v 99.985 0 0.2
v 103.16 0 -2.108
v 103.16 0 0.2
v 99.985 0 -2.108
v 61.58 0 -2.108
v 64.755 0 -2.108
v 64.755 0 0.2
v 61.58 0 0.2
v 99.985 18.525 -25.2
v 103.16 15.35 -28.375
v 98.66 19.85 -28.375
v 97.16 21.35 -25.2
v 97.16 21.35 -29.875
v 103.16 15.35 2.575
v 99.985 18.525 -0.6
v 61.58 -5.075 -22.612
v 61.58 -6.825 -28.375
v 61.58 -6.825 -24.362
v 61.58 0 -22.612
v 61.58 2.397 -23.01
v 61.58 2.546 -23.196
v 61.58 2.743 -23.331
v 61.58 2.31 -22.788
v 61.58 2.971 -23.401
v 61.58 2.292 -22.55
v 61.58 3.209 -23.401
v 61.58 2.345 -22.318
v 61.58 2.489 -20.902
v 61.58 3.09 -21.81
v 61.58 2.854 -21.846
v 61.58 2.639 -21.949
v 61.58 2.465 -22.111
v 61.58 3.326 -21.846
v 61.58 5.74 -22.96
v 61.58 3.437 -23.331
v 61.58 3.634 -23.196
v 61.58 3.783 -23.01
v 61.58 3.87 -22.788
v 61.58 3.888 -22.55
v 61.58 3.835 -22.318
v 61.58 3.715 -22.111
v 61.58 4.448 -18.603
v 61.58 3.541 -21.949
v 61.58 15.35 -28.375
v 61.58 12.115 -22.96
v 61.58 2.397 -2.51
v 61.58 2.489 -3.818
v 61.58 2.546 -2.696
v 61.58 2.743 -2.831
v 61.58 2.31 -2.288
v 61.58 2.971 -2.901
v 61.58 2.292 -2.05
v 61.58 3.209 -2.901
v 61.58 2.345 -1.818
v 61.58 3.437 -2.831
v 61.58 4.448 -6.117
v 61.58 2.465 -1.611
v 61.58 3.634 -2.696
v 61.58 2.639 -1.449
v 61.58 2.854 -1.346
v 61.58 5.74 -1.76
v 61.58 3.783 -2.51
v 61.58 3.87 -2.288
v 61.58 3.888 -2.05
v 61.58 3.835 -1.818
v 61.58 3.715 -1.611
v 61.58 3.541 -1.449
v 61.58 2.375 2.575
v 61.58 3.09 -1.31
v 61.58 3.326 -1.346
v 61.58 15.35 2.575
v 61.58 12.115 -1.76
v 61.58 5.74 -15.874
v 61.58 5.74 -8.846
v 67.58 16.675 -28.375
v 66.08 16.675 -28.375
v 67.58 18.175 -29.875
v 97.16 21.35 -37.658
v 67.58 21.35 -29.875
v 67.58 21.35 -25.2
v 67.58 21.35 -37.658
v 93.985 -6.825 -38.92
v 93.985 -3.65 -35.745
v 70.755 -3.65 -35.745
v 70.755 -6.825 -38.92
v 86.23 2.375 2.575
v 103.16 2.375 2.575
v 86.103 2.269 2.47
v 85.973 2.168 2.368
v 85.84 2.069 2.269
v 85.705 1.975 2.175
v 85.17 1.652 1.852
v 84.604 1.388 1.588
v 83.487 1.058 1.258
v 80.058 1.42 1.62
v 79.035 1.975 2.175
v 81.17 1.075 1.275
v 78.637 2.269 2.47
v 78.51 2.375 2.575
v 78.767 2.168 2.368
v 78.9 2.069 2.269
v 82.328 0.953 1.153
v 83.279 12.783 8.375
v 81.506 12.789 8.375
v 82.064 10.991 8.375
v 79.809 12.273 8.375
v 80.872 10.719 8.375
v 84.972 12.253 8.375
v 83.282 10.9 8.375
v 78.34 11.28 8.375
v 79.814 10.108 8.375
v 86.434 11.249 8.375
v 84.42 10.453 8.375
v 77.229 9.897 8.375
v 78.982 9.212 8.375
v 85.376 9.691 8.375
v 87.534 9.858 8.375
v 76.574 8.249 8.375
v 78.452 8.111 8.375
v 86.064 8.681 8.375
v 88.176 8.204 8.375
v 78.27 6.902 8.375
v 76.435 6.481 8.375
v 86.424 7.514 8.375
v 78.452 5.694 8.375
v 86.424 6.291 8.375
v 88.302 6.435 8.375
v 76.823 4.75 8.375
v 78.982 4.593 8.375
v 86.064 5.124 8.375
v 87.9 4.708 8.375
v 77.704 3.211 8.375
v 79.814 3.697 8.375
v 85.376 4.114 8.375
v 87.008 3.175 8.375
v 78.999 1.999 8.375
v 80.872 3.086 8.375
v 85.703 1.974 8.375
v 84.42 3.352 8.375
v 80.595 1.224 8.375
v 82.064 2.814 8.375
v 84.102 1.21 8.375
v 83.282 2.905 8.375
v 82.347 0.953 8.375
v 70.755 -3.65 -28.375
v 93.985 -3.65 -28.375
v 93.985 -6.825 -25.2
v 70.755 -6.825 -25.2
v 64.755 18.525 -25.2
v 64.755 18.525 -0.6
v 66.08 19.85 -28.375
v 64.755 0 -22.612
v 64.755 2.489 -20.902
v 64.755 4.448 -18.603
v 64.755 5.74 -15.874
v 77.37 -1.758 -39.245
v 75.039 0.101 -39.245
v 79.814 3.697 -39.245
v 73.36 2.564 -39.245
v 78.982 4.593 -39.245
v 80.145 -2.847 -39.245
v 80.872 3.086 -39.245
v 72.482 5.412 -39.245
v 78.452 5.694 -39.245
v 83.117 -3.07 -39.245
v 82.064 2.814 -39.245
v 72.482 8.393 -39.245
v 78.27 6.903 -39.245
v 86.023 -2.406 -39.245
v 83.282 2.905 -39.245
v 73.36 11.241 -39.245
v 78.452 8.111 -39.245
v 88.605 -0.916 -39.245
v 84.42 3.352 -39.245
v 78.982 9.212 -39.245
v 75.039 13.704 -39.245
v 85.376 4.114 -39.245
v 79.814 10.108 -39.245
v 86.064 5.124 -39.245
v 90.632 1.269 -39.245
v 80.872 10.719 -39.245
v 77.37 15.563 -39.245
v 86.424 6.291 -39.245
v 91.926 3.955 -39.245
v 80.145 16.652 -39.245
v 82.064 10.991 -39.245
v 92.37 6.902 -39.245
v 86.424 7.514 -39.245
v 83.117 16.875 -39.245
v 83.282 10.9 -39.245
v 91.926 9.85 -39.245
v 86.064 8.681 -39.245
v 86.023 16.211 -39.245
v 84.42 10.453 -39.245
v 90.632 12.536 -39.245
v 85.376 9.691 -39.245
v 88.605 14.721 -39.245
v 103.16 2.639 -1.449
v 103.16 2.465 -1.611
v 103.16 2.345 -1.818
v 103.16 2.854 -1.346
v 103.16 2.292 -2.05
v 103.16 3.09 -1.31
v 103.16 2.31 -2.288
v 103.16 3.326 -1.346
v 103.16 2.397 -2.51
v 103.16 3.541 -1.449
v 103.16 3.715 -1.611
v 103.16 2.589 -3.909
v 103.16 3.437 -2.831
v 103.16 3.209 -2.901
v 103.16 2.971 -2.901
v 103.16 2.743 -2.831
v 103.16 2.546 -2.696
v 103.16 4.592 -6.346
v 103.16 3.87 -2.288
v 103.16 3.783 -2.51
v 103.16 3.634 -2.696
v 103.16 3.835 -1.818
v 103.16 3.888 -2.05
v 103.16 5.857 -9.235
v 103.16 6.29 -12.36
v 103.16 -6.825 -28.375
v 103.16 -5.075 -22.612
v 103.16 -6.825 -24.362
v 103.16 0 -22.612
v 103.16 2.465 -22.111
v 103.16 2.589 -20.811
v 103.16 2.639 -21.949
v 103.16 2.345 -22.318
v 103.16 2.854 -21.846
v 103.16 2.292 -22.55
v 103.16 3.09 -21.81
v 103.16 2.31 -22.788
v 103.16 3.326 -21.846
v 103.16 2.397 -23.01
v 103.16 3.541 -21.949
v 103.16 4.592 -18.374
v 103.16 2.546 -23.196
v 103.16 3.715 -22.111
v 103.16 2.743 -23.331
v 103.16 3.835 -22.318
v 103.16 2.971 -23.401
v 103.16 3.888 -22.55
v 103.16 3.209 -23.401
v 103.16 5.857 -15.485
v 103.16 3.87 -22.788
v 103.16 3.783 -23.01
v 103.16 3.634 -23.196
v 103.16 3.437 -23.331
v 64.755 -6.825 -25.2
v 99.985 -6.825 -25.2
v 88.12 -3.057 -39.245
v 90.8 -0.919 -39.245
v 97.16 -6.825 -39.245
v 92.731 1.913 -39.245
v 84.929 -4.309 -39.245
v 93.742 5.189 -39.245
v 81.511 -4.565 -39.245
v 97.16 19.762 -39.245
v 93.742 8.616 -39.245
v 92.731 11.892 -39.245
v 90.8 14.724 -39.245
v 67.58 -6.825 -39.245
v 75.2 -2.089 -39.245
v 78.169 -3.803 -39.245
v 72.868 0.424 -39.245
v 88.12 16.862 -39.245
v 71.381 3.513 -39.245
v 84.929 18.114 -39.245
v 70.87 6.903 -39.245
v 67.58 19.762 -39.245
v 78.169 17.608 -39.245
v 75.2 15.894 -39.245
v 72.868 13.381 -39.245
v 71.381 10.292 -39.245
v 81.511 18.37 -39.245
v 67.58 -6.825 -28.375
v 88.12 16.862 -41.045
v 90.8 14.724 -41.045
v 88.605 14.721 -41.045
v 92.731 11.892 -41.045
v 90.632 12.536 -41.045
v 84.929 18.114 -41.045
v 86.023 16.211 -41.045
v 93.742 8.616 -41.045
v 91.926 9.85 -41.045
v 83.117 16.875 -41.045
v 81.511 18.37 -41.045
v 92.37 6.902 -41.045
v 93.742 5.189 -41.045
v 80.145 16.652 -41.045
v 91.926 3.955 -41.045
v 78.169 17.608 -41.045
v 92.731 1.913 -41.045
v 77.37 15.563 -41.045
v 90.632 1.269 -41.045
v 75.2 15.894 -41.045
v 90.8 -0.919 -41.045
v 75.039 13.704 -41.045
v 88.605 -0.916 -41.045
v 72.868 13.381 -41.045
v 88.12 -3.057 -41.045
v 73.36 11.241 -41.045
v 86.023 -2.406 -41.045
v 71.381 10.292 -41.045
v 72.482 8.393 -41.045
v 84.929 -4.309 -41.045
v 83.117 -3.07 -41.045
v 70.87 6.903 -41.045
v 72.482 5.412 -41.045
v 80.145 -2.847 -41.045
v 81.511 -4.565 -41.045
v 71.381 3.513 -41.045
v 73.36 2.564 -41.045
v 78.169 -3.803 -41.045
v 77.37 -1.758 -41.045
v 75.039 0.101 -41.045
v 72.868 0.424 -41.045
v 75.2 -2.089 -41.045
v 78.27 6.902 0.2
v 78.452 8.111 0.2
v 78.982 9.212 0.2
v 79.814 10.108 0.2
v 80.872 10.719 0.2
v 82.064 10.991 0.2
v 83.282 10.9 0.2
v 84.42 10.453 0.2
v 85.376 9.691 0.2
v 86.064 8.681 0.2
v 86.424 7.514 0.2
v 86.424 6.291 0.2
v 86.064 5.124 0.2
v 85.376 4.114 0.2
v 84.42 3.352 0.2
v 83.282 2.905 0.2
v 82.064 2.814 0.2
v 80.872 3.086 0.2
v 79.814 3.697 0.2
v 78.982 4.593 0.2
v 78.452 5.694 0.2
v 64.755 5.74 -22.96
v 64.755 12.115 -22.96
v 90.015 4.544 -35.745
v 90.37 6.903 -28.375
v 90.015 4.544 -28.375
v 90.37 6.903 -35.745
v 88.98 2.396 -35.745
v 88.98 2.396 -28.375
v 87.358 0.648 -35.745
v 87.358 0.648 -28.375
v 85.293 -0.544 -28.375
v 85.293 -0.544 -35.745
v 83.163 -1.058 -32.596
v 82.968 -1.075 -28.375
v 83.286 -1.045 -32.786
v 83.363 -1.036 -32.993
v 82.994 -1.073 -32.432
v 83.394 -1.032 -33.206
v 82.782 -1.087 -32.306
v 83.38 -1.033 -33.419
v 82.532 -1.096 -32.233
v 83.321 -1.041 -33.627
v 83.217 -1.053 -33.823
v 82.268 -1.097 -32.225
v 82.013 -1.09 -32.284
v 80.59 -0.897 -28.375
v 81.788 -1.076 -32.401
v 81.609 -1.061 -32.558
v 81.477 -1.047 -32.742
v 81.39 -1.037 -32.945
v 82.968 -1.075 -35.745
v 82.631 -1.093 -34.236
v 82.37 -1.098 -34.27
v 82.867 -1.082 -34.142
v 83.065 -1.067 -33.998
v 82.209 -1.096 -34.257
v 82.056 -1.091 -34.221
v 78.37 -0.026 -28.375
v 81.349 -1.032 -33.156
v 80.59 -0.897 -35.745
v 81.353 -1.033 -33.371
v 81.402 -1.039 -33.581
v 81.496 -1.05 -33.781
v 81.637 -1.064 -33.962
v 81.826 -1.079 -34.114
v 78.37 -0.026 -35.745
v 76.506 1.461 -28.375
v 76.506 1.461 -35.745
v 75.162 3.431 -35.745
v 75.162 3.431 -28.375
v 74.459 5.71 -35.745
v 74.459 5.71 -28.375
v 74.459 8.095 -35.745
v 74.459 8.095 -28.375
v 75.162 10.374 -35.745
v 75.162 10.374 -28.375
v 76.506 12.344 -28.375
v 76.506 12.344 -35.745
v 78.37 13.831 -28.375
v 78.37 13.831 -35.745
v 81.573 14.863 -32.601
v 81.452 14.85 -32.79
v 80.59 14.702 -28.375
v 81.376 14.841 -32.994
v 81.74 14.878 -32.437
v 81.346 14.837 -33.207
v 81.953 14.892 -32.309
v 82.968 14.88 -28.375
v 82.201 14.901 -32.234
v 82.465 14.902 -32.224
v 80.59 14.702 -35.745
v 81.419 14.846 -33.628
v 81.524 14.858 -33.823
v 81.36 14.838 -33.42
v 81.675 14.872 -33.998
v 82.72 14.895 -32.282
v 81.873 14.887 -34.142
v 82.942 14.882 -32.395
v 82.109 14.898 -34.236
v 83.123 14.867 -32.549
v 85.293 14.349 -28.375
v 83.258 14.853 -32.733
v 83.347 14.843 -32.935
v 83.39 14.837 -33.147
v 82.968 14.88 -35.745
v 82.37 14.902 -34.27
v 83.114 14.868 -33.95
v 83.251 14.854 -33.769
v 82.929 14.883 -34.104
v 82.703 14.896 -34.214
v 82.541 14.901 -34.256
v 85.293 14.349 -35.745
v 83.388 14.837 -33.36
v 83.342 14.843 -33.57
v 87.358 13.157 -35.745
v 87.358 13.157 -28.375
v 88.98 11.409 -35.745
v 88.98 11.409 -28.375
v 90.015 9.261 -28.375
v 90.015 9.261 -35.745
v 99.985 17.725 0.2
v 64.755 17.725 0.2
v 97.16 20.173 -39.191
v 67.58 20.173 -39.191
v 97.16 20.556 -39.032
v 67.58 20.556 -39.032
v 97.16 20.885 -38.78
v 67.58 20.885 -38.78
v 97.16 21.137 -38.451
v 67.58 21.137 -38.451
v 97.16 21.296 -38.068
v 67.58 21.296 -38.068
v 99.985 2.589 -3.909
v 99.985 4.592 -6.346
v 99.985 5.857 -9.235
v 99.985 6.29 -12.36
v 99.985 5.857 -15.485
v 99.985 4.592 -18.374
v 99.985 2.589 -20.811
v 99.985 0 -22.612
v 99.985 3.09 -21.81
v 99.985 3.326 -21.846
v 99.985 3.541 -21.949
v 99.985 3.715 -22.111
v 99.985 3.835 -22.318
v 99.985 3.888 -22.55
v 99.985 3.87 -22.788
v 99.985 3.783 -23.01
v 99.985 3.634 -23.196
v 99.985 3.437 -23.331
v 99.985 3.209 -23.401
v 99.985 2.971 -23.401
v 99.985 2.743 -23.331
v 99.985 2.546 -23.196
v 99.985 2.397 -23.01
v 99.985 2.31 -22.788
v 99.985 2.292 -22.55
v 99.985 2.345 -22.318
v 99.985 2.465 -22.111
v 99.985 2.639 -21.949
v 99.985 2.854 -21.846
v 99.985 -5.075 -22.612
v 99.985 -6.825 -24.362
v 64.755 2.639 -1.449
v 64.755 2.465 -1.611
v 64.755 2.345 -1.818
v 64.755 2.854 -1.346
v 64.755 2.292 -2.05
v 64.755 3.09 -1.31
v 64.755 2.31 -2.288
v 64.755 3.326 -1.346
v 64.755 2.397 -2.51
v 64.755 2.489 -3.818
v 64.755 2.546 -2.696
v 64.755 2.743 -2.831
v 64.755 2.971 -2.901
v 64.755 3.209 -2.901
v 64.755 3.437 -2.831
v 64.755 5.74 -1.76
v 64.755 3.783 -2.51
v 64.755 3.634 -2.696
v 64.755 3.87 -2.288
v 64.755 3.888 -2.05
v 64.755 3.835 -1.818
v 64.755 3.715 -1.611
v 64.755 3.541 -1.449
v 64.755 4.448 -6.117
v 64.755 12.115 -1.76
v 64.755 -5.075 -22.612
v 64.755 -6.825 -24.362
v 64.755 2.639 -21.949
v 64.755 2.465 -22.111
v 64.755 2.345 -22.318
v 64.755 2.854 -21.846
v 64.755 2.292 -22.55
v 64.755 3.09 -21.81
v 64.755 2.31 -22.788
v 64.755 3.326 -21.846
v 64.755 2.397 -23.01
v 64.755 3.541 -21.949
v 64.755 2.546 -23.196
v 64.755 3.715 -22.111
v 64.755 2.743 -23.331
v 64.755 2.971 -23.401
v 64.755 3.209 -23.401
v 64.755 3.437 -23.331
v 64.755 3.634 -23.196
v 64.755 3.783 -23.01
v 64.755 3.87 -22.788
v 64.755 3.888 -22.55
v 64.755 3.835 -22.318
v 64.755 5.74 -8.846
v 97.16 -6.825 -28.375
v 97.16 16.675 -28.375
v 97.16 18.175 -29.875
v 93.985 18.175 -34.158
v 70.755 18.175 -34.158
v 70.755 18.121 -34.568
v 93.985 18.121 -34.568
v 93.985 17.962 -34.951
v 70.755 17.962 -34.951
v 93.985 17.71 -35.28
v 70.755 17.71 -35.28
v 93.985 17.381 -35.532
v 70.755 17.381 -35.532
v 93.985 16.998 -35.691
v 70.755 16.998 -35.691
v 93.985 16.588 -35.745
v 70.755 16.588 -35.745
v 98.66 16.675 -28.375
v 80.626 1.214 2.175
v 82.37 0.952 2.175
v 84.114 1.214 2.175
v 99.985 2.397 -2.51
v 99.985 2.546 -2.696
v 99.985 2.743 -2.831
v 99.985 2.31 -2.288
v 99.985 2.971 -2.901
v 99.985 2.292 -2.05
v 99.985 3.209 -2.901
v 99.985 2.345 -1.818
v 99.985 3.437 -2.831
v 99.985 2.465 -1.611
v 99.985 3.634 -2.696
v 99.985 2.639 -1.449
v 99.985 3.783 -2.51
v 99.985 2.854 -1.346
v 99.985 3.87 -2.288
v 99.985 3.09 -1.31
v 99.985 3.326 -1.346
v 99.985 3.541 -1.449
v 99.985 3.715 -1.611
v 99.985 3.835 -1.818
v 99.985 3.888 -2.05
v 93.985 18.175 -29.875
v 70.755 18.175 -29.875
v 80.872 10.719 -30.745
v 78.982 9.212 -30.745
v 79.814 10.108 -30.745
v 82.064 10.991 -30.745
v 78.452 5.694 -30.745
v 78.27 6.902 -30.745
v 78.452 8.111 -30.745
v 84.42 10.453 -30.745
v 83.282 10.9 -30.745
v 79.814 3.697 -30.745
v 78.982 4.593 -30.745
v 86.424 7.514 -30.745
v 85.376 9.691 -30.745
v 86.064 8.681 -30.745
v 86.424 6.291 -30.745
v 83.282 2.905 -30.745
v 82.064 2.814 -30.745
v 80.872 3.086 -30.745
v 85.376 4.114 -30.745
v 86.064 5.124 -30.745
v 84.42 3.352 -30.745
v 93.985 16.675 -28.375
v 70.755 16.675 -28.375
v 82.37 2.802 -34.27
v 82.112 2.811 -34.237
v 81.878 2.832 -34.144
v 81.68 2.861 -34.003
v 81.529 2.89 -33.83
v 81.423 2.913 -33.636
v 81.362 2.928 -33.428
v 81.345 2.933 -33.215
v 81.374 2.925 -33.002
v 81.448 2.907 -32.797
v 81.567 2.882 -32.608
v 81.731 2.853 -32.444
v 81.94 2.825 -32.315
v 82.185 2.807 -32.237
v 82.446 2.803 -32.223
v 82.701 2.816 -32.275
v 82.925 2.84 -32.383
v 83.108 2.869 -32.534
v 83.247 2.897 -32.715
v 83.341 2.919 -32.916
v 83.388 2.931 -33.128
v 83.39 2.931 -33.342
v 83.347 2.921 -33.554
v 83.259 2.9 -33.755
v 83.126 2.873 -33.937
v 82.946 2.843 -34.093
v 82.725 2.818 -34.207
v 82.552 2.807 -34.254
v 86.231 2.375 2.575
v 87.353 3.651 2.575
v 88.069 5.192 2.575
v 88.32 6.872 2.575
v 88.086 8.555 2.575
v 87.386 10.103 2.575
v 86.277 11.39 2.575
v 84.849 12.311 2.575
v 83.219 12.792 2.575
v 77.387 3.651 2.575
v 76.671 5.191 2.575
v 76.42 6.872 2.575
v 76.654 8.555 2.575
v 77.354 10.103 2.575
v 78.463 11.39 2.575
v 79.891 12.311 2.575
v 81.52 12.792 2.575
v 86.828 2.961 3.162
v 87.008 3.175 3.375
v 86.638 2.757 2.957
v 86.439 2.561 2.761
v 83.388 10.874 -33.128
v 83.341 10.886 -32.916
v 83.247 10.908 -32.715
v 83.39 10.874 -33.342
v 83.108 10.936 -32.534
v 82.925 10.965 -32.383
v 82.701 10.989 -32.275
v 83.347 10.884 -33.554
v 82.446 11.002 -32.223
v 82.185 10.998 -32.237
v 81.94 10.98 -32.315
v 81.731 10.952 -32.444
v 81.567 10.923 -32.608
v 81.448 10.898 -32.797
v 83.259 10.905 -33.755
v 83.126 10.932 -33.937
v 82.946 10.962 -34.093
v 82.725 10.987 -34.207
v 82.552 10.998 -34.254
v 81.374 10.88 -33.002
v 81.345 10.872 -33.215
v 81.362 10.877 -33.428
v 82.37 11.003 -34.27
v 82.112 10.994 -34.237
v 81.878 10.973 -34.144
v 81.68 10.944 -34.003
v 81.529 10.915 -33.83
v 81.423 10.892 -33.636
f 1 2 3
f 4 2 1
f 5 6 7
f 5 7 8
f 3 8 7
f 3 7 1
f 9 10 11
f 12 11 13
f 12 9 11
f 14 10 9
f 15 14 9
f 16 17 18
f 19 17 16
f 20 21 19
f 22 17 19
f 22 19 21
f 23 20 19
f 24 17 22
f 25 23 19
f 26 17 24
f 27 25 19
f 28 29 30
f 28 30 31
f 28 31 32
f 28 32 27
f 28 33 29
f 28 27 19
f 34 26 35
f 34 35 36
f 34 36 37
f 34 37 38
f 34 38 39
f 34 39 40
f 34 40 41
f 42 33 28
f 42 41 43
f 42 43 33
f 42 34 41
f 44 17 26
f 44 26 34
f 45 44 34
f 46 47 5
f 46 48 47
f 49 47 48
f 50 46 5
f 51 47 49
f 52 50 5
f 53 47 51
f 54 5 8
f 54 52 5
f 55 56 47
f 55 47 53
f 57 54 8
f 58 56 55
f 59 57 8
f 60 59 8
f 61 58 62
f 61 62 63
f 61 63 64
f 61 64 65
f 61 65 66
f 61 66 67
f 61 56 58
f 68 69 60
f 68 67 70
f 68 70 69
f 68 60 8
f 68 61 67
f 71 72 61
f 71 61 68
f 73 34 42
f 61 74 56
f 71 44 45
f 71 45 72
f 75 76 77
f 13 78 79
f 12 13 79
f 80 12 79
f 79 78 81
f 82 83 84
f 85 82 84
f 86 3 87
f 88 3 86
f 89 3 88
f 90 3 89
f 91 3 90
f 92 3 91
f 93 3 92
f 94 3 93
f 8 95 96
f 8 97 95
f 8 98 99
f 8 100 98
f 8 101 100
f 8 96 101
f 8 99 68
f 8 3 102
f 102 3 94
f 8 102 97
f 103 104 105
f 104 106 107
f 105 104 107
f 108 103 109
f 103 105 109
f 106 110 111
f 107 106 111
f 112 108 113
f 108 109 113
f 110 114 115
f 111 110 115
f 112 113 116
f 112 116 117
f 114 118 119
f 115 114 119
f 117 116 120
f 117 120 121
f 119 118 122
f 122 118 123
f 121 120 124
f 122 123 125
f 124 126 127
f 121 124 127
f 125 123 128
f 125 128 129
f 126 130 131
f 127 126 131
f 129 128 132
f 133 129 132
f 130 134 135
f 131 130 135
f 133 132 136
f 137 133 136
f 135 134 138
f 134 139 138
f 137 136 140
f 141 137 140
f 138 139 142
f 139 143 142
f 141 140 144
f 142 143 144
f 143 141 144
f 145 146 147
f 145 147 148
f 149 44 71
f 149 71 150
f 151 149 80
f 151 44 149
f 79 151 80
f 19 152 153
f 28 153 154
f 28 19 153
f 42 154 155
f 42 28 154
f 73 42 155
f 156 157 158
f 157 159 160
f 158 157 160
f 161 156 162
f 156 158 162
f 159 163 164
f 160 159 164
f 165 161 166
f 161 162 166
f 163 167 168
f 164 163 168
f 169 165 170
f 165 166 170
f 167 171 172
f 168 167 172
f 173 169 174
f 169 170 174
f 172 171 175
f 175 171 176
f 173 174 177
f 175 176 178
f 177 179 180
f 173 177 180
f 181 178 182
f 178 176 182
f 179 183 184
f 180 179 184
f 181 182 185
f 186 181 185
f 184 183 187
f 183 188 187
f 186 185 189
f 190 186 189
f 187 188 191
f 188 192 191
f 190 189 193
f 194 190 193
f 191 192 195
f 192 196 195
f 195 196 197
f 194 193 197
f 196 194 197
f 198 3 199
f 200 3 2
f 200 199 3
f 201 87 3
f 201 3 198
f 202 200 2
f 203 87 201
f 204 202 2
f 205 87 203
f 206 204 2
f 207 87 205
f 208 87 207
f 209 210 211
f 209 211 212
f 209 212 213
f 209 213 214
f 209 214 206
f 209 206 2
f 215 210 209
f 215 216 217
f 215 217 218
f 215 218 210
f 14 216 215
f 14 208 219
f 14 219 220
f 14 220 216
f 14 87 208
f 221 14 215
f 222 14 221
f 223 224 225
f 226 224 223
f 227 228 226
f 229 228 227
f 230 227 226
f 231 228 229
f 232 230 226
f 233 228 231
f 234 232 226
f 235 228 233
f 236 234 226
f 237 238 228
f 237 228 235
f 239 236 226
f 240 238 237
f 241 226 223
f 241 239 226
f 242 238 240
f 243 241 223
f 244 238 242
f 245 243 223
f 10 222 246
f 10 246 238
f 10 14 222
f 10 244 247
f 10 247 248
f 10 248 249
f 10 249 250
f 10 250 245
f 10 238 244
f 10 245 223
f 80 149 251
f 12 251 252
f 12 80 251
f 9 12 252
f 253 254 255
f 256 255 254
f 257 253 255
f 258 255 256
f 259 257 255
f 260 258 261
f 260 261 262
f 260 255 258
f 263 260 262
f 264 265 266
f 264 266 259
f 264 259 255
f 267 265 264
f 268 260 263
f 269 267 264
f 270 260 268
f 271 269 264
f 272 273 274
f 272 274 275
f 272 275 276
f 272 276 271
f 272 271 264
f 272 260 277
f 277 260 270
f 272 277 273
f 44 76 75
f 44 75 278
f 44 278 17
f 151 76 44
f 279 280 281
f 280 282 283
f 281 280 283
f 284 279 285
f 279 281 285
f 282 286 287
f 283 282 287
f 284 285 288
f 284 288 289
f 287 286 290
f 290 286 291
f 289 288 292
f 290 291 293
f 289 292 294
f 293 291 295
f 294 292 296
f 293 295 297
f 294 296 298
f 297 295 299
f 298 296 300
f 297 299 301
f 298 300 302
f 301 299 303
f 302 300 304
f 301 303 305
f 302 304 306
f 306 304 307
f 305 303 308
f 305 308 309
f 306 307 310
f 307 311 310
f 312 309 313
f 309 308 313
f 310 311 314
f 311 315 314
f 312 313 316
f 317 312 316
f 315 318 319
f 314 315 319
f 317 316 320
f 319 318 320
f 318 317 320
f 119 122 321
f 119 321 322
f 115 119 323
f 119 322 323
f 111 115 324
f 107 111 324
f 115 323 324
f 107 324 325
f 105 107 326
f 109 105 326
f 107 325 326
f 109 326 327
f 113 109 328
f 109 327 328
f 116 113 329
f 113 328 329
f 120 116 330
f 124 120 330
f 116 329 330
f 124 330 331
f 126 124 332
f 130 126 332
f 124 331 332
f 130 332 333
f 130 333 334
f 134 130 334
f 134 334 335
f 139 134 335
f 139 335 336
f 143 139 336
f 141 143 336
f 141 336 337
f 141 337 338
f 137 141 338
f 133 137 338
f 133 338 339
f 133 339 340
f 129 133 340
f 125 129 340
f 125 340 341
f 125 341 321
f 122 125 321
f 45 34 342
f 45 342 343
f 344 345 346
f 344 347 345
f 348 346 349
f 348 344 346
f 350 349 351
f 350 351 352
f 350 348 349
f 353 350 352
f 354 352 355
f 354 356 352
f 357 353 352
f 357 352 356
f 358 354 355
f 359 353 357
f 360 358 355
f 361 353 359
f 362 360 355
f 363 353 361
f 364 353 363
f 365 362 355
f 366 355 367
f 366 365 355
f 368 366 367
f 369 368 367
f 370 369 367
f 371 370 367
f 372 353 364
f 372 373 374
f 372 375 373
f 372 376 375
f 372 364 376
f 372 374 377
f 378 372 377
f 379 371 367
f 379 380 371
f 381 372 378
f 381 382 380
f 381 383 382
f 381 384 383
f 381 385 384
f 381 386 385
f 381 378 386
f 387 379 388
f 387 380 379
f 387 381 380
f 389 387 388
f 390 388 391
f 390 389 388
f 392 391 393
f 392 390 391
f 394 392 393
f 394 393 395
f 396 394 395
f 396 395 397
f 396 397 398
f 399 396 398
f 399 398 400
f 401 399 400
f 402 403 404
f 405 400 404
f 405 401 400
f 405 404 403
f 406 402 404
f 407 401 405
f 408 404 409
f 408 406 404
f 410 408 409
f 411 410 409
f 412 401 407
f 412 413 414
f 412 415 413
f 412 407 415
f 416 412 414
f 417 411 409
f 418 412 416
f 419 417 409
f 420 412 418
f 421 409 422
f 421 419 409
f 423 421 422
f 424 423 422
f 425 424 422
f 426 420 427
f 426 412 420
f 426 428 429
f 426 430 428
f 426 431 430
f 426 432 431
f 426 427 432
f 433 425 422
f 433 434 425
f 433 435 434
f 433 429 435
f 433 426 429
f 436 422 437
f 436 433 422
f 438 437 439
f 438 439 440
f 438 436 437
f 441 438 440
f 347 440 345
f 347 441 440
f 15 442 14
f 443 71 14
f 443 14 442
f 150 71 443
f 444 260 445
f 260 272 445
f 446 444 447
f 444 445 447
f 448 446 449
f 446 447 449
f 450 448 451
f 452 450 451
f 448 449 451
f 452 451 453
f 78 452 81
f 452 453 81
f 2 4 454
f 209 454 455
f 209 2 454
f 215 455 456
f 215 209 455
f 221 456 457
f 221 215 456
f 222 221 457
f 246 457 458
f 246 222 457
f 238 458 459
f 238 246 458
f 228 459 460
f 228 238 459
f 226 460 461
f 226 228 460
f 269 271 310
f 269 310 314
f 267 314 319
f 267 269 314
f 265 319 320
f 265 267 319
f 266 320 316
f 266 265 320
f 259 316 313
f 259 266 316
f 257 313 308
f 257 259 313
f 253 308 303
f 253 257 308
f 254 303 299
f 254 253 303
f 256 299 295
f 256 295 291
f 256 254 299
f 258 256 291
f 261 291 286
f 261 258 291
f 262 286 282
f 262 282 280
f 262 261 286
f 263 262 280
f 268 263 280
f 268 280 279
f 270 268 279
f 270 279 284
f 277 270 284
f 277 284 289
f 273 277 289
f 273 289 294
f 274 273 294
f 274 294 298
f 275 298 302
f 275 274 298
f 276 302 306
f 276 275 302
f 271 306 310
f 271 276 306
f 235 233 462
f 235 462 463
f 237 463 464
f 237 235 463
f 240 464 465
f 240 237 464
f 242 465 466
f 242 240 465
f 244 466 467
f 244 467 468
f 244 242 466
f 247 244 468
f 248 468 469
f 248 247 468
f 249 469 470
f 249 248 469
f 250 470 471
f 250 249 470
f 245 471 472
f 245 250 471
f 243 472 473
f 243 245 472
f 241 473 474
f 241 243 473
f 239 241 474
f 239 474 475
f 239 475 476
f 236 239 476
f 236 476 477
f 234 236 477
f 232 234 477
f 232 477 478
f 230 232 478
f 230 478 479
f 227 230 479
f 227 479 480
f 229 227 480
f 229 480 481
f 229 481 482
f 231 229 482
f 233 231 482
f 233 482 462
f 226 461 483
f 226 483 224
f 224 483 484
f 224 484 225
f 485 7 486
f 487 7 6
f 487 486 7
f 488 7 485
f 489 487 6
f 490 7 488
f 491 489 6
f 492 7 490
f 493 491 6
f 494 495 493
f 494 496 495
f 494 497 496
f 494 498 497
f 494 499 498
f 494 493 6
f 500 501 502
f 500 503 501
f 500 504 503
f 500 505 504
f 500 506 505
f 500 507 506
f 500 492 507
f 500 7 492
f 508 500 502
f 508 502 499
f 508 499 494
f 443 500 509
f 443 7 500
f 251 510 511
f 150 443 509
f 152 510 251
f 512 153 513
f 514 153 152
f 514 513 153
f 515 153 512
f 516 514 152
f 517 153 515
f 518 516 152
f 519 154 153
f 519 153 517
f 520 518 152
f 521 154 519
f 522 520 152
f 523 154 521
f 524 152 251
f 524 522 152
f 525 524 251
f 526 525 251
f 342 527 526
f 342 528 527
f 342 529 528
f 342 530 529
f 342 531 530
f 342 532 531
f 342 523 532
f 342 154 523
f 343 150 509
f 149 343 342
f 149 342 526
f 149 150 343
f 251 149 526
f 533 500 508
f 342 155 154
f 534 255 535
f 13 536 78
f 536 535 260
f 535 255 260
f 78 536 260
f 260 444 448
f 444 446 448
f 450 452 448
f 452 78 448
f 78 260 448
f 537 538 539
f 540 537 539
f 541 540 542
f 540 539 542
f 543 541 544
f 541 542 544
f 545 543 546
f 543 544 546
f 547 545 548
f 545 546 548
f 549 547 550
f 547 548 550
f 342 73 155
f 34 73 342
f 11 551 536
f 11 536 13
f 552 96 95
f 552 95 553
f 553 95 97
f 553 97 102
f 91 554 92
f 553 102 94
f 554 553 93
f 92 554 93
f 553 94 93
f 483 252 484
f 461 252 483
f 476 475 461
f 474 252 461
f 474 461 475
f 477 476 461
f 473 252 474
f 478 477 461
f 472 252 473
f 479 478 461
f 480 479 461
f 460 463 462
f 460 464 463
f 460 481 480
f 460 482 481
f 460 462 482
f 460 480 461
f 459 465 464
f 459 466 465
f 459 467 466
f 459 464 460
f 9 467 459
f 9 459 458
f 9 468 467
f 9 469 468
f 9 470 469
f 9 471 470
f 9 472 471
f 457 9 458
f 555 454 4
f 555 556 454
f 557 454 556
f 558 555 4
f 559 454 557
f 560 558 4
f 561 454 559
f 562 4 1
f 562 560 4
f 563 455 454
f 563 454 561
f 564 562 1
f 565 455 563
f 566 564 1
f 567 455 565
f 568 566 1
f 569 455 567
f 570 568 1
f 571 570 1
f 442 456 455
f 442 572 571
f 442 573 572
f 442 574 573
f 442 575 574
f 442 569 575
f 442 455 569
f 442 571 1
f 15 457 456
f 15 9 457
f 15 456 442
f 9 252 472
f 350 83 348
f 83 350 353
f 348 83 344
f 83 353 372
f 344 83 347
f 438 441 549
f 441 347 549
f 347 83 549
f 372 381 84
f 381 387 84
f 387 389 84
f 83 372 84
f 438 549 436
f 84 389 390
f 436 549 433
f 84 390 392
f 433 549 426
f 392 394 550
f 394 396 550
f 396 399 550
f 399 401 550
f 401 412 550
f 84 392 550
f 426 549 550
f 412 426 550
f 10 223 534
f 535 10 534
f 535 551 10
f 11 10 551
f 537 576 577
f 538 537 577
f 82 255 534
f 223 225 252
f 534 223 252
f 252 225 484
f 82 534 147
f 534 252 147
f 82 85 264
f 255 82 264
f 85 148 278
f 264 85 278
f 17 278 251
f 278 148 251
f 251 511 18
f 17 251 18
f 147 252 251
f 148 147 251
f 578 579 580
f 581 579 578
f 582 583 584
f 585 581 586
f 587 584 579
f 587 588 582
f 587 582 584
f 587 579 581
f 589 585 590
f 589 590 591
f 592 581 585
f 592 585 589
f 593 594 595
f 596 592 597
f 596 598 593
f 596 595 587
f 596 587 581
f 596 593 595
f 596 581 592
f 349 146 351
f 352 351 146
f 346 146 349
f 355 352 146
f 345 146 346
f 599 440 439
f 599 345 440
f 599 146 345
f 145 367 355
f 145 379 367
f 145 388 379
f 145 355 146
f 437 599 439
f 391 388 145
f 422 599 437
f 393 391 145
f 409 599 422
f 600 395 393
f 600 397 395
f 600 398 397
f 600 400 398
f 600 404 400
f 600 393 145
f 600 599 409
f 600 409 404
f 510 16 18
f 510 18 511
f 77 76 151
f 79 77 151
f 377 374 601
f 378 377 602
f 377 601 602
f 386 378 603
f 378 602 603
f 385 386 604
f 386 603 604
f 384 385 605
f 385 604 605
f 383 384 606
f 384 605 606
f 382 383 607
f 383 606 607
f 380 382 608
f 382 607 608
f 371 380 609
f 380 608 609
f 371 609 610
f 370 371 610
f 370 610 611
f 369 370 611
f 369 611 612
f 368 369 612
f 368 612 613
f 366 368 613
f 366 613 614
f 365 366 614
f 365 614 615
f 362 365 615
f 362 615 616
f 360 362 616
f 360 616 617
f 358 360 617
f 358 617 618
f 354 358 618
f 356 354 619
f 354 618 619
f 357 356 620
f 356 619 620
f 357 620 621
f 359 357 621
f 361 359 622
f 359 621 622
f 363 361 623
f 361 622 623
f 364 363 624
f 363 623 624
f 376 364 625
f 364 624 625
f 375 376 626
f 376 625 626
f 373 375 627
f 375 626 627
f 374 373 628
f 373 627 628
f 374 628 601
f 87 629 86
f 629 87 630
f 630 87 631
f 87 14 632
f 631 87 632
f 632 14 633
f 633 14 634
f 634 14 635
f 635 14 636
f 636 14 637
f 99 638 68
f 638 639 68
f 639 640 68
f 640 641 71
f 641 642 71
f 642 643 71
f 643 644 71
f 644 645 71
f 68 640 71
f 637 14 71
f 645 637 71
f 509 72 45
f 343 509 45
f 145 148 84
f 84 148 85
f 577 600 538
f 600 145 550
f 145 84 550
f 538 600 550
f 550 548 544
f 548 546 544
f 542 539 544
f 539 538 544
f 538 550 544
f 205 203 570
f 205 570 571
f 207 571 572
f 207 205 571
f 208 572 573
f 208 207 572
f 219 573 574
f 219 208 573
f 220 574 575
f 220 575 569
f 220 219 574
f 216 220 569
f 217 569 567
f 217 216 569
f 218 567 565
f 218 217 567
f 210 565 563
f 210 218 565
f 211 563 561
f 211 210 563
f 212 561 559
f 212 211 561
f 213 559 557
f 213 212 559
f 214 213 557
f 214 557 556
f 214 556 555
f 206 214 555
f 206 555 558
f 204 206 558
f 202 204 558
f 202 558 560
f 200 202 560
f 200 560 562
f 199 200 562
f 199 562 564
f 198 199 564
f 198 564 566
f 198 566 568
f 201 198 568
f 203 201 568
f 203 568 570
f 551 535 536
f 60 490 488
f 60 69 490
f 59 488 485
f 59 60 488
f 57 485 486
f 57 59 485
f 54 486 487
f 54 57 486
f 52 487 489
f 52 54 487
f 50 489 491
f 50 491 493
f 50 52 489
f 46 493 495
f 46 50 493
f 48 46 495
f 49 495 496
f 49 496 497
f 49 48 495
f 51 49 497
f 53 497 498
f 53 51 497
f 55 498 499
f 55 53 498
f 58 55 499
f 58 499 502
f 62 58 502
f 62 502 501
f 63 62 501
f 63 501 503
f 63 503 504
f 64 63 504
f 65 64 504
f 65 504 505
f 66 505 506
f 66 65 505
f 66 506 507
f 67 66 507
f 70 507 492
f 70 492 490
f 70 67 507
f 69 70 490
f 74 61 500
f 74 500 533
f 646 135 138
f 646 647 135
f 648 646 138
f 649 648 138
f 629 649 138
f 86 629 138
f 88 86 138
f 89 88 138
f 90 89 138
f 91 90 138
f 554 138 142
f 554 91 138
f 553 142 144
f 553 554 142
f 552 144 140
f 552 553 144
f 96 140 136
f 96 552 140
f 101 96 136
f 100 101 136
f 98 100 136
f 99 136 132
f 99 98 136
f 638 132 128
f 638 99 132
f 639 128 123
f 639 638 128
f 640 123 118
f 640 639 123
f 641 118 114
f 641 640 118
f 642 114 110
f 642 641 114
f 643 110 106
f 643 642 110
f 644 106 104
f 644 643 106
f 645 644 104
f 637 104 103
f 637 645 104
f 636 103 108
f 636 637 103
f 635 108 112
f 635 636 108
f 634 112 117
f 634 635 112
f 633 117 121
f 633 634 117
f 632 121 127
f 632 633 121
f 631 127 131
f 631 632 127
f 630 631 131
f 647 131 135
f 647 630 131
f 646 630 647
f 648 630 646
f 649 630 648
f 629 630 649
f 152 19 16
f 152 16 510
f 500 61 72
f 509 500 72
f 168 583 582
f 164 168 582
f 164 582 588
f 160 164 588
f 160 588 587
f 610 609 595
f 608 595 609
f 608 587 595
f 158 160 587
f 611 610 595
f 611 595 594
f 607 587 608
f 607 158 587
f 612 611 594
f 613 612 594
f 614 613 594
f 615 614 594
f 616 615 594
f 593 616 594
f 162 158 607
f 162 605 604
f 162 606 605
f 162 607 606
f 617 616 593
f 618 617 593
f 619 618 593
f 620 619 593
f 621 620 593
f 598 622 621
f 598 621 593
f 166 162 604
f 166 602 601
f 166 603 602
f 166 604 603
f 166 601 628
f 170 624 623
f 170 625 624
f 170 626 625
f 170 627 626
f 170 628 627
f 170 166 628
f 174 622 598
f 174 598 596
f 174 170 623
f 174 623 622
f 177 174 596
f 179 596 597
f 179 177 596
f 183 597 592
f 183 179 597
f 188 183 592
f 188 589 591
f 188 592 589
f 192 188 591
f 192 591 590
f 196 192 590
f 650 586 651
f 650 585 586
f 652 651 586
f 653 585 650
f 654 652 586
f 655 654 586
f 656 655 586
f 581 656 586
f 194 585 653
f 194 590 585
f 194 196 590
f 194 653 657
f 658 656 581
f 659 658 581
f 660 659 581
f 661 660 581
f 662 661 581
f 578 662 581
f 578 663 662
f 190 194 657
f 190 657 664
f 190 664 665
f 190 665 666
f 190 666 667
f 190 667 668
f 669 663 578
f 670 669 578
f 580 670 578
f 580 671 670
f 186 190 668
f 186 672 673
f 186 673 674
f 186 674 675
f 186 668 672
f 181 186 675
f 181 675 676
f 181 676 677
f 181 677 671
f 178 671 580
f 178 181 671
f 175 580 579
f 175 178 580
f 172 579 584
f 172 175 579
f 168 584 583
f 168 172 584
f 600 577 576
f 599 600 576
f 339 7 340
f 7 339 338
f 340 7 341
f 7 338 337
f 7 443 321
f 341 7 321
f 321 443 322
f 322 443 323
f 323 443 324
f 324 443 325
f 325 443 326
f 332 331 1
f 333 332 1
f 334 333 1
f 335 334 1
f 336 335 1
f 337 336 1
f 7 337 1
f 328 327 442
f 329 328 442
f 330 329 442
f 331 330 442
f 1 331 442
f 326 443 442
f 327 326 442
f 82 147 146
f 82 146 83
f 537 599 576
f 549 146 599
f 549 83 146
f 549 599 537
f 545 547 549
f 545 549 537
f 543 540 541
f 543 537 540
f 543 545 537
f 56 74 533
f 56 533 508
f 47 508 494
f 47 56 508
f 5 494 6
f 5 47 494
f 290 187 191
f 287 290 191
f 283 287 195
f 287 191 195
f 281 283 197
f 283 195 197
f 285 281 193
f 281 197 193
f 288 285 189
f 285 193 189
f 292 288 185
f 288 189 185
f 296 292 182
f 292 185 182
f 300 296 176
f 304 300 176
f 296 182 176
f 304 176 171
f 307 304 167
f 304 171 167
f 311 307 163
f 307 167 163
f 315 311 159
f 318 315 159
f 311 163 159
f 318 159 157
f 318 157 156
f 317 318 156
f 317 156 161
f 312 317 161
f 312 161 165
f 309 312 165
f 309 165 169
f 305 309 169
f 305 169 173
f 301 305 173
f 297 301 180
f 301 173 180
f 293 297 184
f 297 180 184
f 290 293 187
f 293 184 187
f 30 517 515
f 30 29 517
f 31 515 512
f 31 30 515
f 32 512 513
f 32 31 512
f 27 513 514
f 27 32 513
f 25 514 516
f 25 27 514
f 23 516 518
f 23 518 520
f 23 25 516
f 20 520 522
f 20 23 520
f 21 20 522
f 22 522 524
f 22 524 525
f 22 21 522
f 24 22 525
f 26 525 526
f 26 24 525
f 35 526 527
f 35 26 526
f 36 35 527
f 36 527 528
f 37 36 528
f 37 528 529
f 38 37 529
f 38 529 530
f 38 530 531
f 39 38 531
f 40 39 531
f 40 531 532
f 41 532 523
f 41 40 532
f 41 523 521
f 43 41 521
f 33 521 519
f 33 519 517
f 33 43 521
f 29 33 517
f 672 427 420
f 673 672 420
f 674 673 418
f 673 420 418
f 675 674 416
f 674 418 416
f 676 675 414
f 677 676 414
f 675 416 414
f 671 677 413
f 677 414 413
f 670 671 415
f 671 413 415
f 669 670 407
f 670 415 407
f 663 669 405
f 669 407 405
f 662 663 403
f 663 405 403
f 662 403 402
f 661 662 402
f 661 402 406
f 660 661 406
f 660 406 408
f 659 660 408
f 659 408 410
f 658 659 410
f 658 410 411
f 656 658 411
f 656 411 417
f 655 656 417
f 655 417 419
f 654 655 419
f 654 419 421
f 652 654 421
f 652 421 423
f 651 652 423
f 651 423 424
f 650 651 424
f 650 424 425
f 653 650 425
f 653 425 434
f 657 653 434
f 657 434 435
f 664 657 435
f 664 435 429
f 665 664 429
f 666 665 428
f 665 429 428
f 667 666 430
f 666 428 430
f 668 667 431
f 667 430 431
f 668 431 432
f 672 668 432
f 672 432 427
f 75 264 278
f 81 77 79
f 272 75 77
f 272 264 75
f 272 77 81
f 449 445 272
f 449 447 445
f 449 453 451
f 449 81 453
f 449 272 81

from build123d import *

# Parameters (mm, degrees)
SKETCH1_W                       = 25
SKETCH1_H                       = 30
BOSS_EXTRUDE1_DEPTH             = 3.175
SKETCH2_W                       = 25
SKETCH2_H                       = 3.175
BOSS_EXTRUDE2_DEPTH             = 41.58
SKETCH3_W                       = 3.175
SKETCH3_H                       = 25
BOSS_EXTRUDE3_DEPTH             = 30
CUT_EXTRUDE1_REACH              = 60.775
SKETCH4_R                       = 11.5
CUT_EXTRUDE2_REACH              = 60.775
SKETCH5_R                       = 0.8
CUT_EXTRUDE3_REACH              = 60.775
SKETCH6_R                       = 0.8
SKETCH6_R_2                     = 0.799851166
SKETCH6_W                       = 21.2
SKETCH6_H                       = 6.375
CUT_EXTRUDE4_REACH              = 60.775
SKETCH7_R                       = 11.5
BOSS_EXTRUDE4_DEPTH             = 0.2
SKETCH9_W                       = 41.58
SKETCH9_H                       = 33.175
BOSS_EXTRUDE5_DEPTH             = 3.175
BOSS_EXTRUDE6_DEPTH             = 0.2
SKETCH11_W                      = 41.58
SKETCH11_H                      = 33.175
BOSS_EXTRUDE7_DEPTH             = 3.175
CHAMFER1_SIZE                   = 3.175
CHAMFER2_SIZE                   = 3.175
SKETCH13_W                      = 29.58
SKETCH13_H                      = 3.175
BOSS_EXTRUDE8_DEPTH             = 7.695
BOSS_EXTRUDE9_REACH             = 59.968
SKETCH14_W                      = 29.58
SKETCH14_H                      = 3.5
BOSS_EXTRUDE9_DIRECTION_2_DEPTH = 25
FILLET1_R                       = 1.5875
FILLET2_R                       = 1.5875
CUT_EXTRUDE5_REACH              = 70.161
SKETCH16_R                      = 7.1
SKETCH20_R                      = 8
SKETCH20_R_2                    = 4.1
BOSS_EXTRUDE11_DEPTH            = 5
CUT_EXTRUDE6_START              = -21.7275
SKETCH21_R                      = 1.025
CUT_EXTRUDE6_DEPTH              = 16
BOSS_EXTRUDE12_DEPTH            = 5
BOSS_EXTRUDE12_DEPTH_BACK       = 1.2
SKETCH23_R                      = 5.95
SKETCH23_R_2                    = 4.1
CUT_EXTRUDE9_START              = -0.8
SKETCH35_W                      = 56.674577384
SKETCH35_H                      = 32.233153273
SKETCH35_R                      = 5.95
CUT_EXTRUDE9_DEPTH              = 0.8
CHAMFER4_SIZE                   = 1.5
SKETCH24_R                      = 11.5
SKETCH24_R_2                    = 10
BOSS_EXTRUDE13_DEPTH            = 1.8
SKETCH25_W                      = 108.105246784
SKETCH25_H                      = 63.591321638
CUT_EXTRUDE7_DEPTH              = 11.825
CHAMFER5_SIZE                   = 6
CUT_EXTRUDE8_START              = -3.175
SKETCH26_R                      = 4.1
CUT_EXTRUDE8_DEPTH              = 3.175
BOSS_EXTRUDE14_START            = 1.975
BOSS_EXTRUDE14_DEPTH            = 1.975
BOSS_EXTRUDE16_START            = 3.5
SKETCH29_R                      = 7.1
SKETCH29_R_2                    = 4.1
BOSS_EXTRUDE16_DEPTH            = 3.5
BOSS_EXTRUDE17_REACH            = 66.275
SKETCH31_W                      = 3.175
SKETCH31_H                      = 26.839044126
BOSS_EXTRUDE18_DEPTH            = 6.825
SKETCH34_R                      = 8
BOSS_EXTRUDE19_DEPTH            = 2.37
CHAMFER7_SIZE                   = 3.175
CHAMFER8_SIZE                   = 1.75


# Some blends are built 0.0001 mm under size
with BuildPart() as part:
    # Sketch1 → Boss-Extrude1 (new body)
    with BuildSketch(Plane(origin=(0, 0, 0), x_dir=(0, 0, -1), z_dir=(1, 0, 0))):
        with Locations((12.5, 15)):
            Rectangle(SKETCH1_W, SKETCH1_H)
    extrude(amount=BOSS_EXTRUDE1_DEPTH)

    # Sketch2 → Boss-Extrude2 (add)
    with BuildSketch(Plane.ZY):
        with Locations((-12.5, 31.5875)):
            Rectangle(SKETCH2_W, SKETCH2_H)
    extrude(amount=-BOSS_EXTRUDE2_DEPTH)

    # Sketch3 → Boss-Extrude3 (add)
    with BuildSketch(Plane.XZ.offset(-30)):
        with Locations((39.9925, -12.5)):
            Rectangle(SKETCH3_W, SKETCH3_H)
    extrude(amount=BOSS_EXTRUDE3_DEPTH)

    # Sketch4 → Cut-Extrude1 (cut, up to next)
    with BuildSketch(Plane.ZY, mode=Mode.PRIVATE) as cut_extrude1_sk1:
        with Locations((-12.359999929, -5.209996254)):
            Circle(SKETCH4_R)
    cut_extrude1_tool1 = extrude(cut_extrude1_sk1.sketch, amount=-CUT_EXTRUDE1_REACH, mode=Mode.PRIVATE) & part.part
    add(cut_extrude1_tool1.solids().sort_by_distance((0, -5.209996, -12.36))[0], mode=Mode.SUBTRACT)

    # Sketch5 → Cut-Extrude2 (cut, up to next)
    with BuildSketch(Plane.ZY, mode=Mode.PRIVATE) as cut_extrude2_sk1:
        with Locations((-22.609999929, 3.090003746)):
            Circle(SKETCH5_R)
    cut_extrude2_tool1 = extrude(cut_extrude2_sk1.sketch, amount=-CUT_EXTRUDE2_REACH, mode=Mode.PRIVATE) & part.part
    # Sketch5 → Cut-Extrude2 (cut, up to next)
    with BuildSketch(Plane.ZY, mode=Mode.PRIVATE) as cut_extrude2_sk2:
        with Locations((-22.609999929, 23.790003746)):
            Circle(SKETCH5_R)
    cut_extrude2_tool2 = extrude(cut_extrude2_sk2.sketch, amount=-CUT_EXTRUDE2_REACH, mode=Mode.PRIVATE) & part.part
    # Sketch5 → Cut-Extrude2 (cut, up to next)
    with BuildSketch(Plane.ZY, mode=Mode.PRIVATE) as cut_extrude2_sk3:
        with Locations((-2.109999929, 23.790003746)):
            Circle(SKETCH5_R)
    cut_extrude2_tool3 = extrude(cut_extrude2_sk3.sketch, amount=-CUT_EXTRUDE2_REACH, mode=Mode.PRIVATE) & part.part
    # Sketch5 → Cut-Extrude2 (cut, up to next)
    with BuildSketch(Plane.ZY, mode=Mode.PRIVATE) as cut_extrude2_sk4:
        with Locations((-2.109999929, 3.090003746)):
            Circle(SKETCH5_R)
    cut_extrude2_tool4 = extrude(cut_extrude2_sk4.sketch, amount=-CUT_EXTRUDE2_REACH, mode=Mode.PRIVATE) & part.part
    add(cut_extrude2_tool1.solids().sort_by_distance((0, 3.090004, -22.61))[0], mode=Mode.SUBTRACT)
    add(cut_extrude2_tool2.solids().sort_by_distance((0, 23.790004, -22.61))[0], mode=Mode.SUBTRACT)
    add(cut_extrude2_tool3.solids().sort_by_distance((0, 23.790004, -2.11))[0], mode=Mode.SUBTRACT)
    add(cut_extrude2_tool4.solids().sort_by_distance((0, 3.090004, -2.11))[0], mode=Mode.SUBTRACT)

    # Sketch6 → Cut-Extrude3 (cut, up to next)
    with BuildSketch(Plane(origin=(41.58, 0, 0), x_dir=(0, 0, -1), z_dir=(1, 0, 0)), mode=Mode.PRIVATE) as cut_extrude3_sk1:
        with Locations(Location((2.109999929, 3.090003746, 0), (0, 0, 180))):
            Circle(SKETCH6_R)
    cut_extrude3_tool1 = extrude(cut_extrude3_sk1.sketch, amount=-CUT_EXTRUDE3_REACH, mode=Mode.PRIVATE) & part.part
    # Sketch6 → Cut-Extrude3 (cut, up to next)
    with BuildSketch(Plane(origin=(41.58, 0, 0), x_dir=(0, 0, -1), z_dir=(1, 0, 0)), mode=Mode.PRIVATE) as cut_extrude3_sk2:
        with Locations(Location((22.609999929, 3.090003746, 0), (0, 0, 180))):
            Circle(SKETCH6_R)
    cut_extrude3_tool2 = extrude(cut_extrude3_sk2.sketch, amount=-CUT_EXTRUDE3_REACH, mode=Mode.PRIVATE) & part.part
    # Sketch6 → Cut-Extrude3 (cut, up to next)
    with BuildSketch(Plane(origin=(41.58, 0, 0), x_dir=(0, 0, -1), z_dir=(1, 0, 0)), mode=Mode.PRIVATE) as cut_extrude3_sk3:
        with Locations((22.609999929, 27.540003746)):
            Circle(SKETCH6_R_2)
    cut_extrude3_tool3 = extrude(cut_extrude3_sk3.sketch, amount=-CUT_EXTRUDE3_REACH, mode=Mode.PRIVATE) & part.part
    # Sketch6 → Cut-Extrude3 (cut, up to next)
    with BuildSketch(Plane(origin=(41.58, 0, 0), x_dir=(0, 0, -1), z_dir=(1, 0, 0)), mode=Mode.PRIVATE) as cut_extrude3_sk4:
        with Locations((2.109999929, 27.540003746)):
            Circle(SKETCH6_R)
    cut_extrude3_tool4 = extrude(cut_extrude3_sk4.sketch, amount=-CUT_EXTRUDE3_REACH, mode=Mode.PRIVATE) & part.part
    # Sketch6 → Cut-Extrude3 (cut, up to next)
    with BuildSketch(Plane(origin=(41.58, 0, 0), x_dir=(0, 0, -1), z_dir=(1, 0, 0)), mode=Mode.PRIVATE) as cut_extrude3_sk5:
        with Locations((12.359999929, 8.927503746)):
            Rectangle(SKETCH6_W, SKETCH6_H)
    cut_extrude3_tool5 = extrude(cut_extrude3_sk5.sketch, amount=-CUT_EXTRUDE3_REACH, mode=Mode.PRIVATE) & part.part
    add(cut_extrude3_tool1.solids().sort_by_distance((41.58, 3.090004, -2.11))[0], mode=Mode.SUBTRACT)
    add(cut_extrude3_tool2.solids().sort_by_distance((41.58, 3.090004, -22.61))[0], mode=Mode.SUBTRACT)
    add(cut_extrude3_tool3.solids().sort_by_distance((41.58, 27.540004, -22.61))[0], mode=Mode.SUBTRACT)
    add(cut_extrude3_tool4.solids().sort_by_distance((41.58, 27.540004, -2.11))[0], mode=Mode.SUBTRACT)
    add(cut_extrude3_tool5.solids().sort_by_distance((41.58, 8.927504, -12.36))[0], mode=Mode.SUBTRACT)

    # Sketch7 → Cut-Extrude4 (cut, up to next)
    with BuildSketch(Plane(origin=(41.58, 0, 0), x_dir=(0, 0, -1), z_dir=(1, 0, 0)), mode=Mode.PRIVATE) as cut_extrude4_sk1:
        with Locations((12.359999929, -5.209996254)):
            Circle(SKETCH7_R)
    cut_extrude4_tool1 = extrude(cut_extrude4_sk1.sketch, amount=-CUT_EXTRUDE4_REACH, mode=Mode.PRIVATE) & part.part
    add(cut_extrude4_tool1.solids().sort_by_distance((41.58, -5.209996, -12.36))[0], mode=Mode.SUBTRACT)

    # Sketch8 → Boss-Extrude4 (add)
    with BuildSketch(Plane.XY):
        Polygon((0, 33.175), (0, 0), (3.175, 0), (3.175, 30), (38.405, 30), (38.405, 0), (41.58, 0), (41.58, 33.175), align=None)
    extrude(amount=BOSS_EXTRUDE4_DEPTH)

    # Sketch9 → Boss-Extrude5 (add)
    with BuildSketch(Plane.XY.offset(0.2)):
        with Locations((20.79, 16.5875)):
            Rectangle(SKETCH9_W, SKETCH9_H)
    extrude(amount=BOSS_EXTRUDE5_DEPTH)

    # Sketch10 → Boss-Extrude6 (add)
    with BuildSketch(Plane(origin=(0, 0, -25), x_dir=(-1, 0, 0), z_dir=(0, 0, -1))):
        Polygon((0, 0), (0, 33.175), (-41.58, 33.175), (-41.58, 0), (-38.405, 0), (-38.405, 30), (-3.175, 30), (-3.175, 0), align=None)
    extrude(amount=BOSS_EXTRUDE6_DEPTH)

    # Sketch11 → Boss-Extrude7 (add)
    with BuildSketch(Plane(origin=(0, 0, -25.2), x_dir=(-1, 0, 0), z_dir=(0, 0, -1))):
        with Locations((-20.79, 16.5875)):
            Rectangle(SKETCH11_W, SKETCH11_H)
    extrude(amount=BOSS_EXTRUDE7_DEPTH)

    # Chamfer1
    chamfer1_edges = [part.edges().sort_by_distance(p)[0] for p in [
        (20.79, 33.175, 3.375),
        (20.79, 33.175, -28.375),
    ]]
    chamfer(chamfer1_edges, length=CHAMFER1_SIZE)

    # Chamfer2
    chamfer2_edges = [part.edges().sort_by_distance(p)[0] for p in [
        (20.79, 0, 3.375),
    ]]
    chamfer(chamfer2_edges, length=CHAMFER2_SIZE - 0.0001)  # a hair under: the kernel refuses the full size

    # Sketch13 → Boss-Extrude8 (add)
    with BuildSketch(Plane(origin=(0, 0, -28.375), x_dir=(-1, 0, 0), z_dir=(0, 0, -1))):
        with Locations((-20.79, 19.7625)):
            Rectangle(SKETCH13_W, SKETCH13_H)
    extrude(amount=BOSS_EXTRUDE8_DEPTH)

    # Boss-Extrude9: up to this face of the body (flat: up to its plane)
    boss_extrude9_end = Plane(part.part.faces().sort_by_distance((20.79, 21.35, -32.2225))[0])
    # Sketch14 → Boss-Extrude9 (add, up to the picked face)
    with BuildSketch(Plane.XZ.offset(-18.175), mode=Mode.PRIVATE) as boss_extrude9_sk1:
        with Locations((20.79, -37.495)):
            Rectangle(SKETCH14_W, SKETCH14_H)
    boss_extrude9_tool1 = split(extrude(boss_extrude9_sk1.sketch, amount=-BOSS_EXTRUDE9_REACH, mode=Mode.PRIVATE), bisect_by=boss_extrude9_end, keep=Keep.BOTH, mode=Mode.PRIVATE)
    add(boss_extrude9_tool1.solids().sort_by(Axis((20.79, 18.175, -37.495), (0, 1, 0)))[0])

    # Sketch14 → Boss-Extrude9 direction 2 (add)
    with BuildSketch(Plane.XZ.offset(-18.175)):
        with Locations((20.79, -37.495)):
            Rectangle(SKETCH14_W, SKETCH14_H)
    extrude(amount=BOSS_EXTRUDE9_DIRECTION_2_DEPTH)

    # Fillet1
    fillet1_edges = [part.edges().sort_by_distance(p)[0] for p in [
        (20.79, 18.175, -35.745),
        (20.79, 21.35, -39.245),
    ]]
    fillet(fillet1_edges, radius=FILLET1_R)

    # Fillet2
    fillet2_edges = [part.edges().sort_by_distance(p)[0] for p in [
        (20.79, 21.35, -28.375),
    ]]
    fillet(fillet2_edges, radius=FILLET2_R)

    # Sketch16 → Cut-Extrude5 (cut, up to next)
    with BuildSketch(Plane(origin=(0, 0, -39.245), x_dir=(-1, 0, 0), z_dir=(0, 0, -1)), mode=Mode.PRIVATE) as cut_extrude5_sk1:
        with Locations((-20.79, 6.9025)):
            Circle(SKETCH16_R)
    cut_extrude5_tool1 = extrude(cut_extrude5_sk1.sketch, amount=-CUT_EXTRUDE5_REACH, mode=Mode.PRIVATE) & part.part
    add(cut_extrude5_tool1.solids().sort_by_distance((20.79, 6.9025, -39.245))[0], mode=Mode.SUBTRACT)

    # Sketch20 → Boss-Extrude11 (add)
    with BuildSketch(Plane.XY.offset(-35.745)):
        with Locations(Location((20.79, 6.9025, 0), (0, 0, 180))):
            Circle(SKETCH20_R)
        with Locations((20.79, 6.9025)):
            Circle(SKETCH20_R_2, mode=Mode.SUBTRACT)
    extrude(amount=BOSS_EXTRUDE11_DEPTH)

    # Sketch21 → Cut-Extrude6 (cut)
    with BuildSketch(Plane.XZ.offset(6.825).offset(CUT_EXTRUDE6_START)):
        with Locations(Location((20.79, -33.245, 0), (0, 0, 270))):
            Circle(SKETCH21_R)
    extrude(amount=CUT_EXTRUDE6_DEPTH, mode=Mode.SUBTRACT)

    # Sketch23 → Boss-Extrude12 (add, two sides: drawn at the far end of the back side and taken through both)
    with BuildSketch(Plane.XY.offset(3.375).offset(-BOSS_EXTRUDE12_DEPTH_BACK)):
        with Locations(Location((20.79, 6.9025, 0), (0, 0, 218.790206305))):
            Circle(SKETCH23_R)
        with Locations((20.79, 6.9025)):
            Circle(SKETCH23_R_2, mode=Mode.SUBTRACT)
    extrude(amount=BOSS_EXTRUDE12_DEPTH + BOSS_EXTRUDE12_DEPTH_BACK)

    # Sketch35 → Cut-Extrude9 (cut)
    with BuildSketch(Plane.XY.offset(3.375).offset(CUT_EXTRUDE9_START)):
        with Locations((23.209536951, 5.991217874)):
            Rectangle(SKETCH35_W, SKETCH35_H)
        with Locations(Location((20.79, 6.9025, 0), (0, 0, 229.545756186))):
            Circle(SKETCH35_R, mode=Mode.SUBTRACT)
    extrude(amount=CUT_EXTRUDE9_DEPTH, mode=Mode.SUBTRACT)

    # Chamfer4
    chamfer4_edges = [part.edges().sort_by_distance(p)[0] for p in [
        (35.58, 20.55625, -28.375),
        (20.79, 18.175, -28.375),
        (6, 20.55625, -28.375),
    ]]
    chamfer(chamfer4_edges, length=CHAMFER4_SIZE)

    # Sketch24 → Boss-Extrude13 (add)
    with BuildSketch(Plane(origin=(0, 0, -39.245), x_dir=(-1, 0, 0), z_dir=(0, 0, -1))):
        with Locations(Location((-20.79, 6.9025, 0), (0, 0, 180))):
            Circle(SKETCH24_R)
        with Locations((-20.79, 6.9025)):
            Circle(SKETCH24_R_2, mode=Mode.SUBTRACT)
    extrude(amount=BOSS_EXTRUDE13_DEPTH)

    # Sketch25 → Cut-Extrude7 (cut)
    with BuildSketch(Plane(origin=(0, 33.175, 0), x_dir=(1, 0, 0), z_dir=(0, 1, 0))):
        with Locations((27.427563227, 10.078434484)):
            Rectangle(SKETCH25_W, SKETCH25_H)
    extrude(amount=-CUT_EXTRUDE7_DEPTH, mode=Mode.SUBTRACT)

    # Chamfer5
    # the kernel refuses this chamfer: 6 mm, written as the material it takes off along each edge
    with BuildSketch(Plane(origin=(41.58, 21.35, -43.805097928), x_dir=(0.027495876610586775, -0.9996219169112968, 0), z_dir=(0, 0, 1)), Plane(origin=(0, 21.35, 18.005097928), x_dir=(-0.02749587661058637, -0.9996219169112968, 0), z_dir=(0, 0, -1))) as chamfer5_piece_1:
        Polygon((CHAMFER5_SIZE * 0.999621916911, -CHAMFER5_SIZE * 0.0274958766106), (-CHAMFER5_SIZE * 0.0274958766106, -CHAMFER5_SIZE * 0.999621916911), (0, 0), align=None)
    extrude(amount=61.810195856, mode=Mode.SUBTRACT)
    with BuildSketch(Plane(origin=(57.010097928, 21.35, 2.575), x_dir=(0, -0.9996219169112969, 0.027495876610586348), z_dir=(-1, 0, 0))) as chamfer5_piece_2:
        Polygon((CHAMFER5_SIZE * 0.999621916911, -CHAMFER5_SIZE * 0.0274958766106), (-CHAMFER5_SIZE * 0.0274958766106, -CHAMFER5_SIZE * 0.999621916911), (0, 0), align=None)
    extrude(amount=72.440195856, mode=Mode.SUBTRACT)

    # Sketch26 → Cut-Extrude8 (cut)
    with BuildSketch(Plane.XY.offset(3.375).offset(CUT_EXTRUDE8_START)):
        with Locations((20.79, 6.9025)):
            Circle(SKETCH26_R)
    extrude(amount=CUT_EXTRUDE8_DEPTH, mode=Mode.SUBTRACT)

    # Sketch27 → Boss-Extrude14 (add)
    with BuildSketch(Plane(origin=(0, 0, 2.175), x_dir=(-1, 0, 0), z_dir=(0, 0, -1)).offset(BOSS_EXTRUDE14_START)):
        with BuildLine():
            Line((-17.454997189, 1.975), (-24.125002811, 1.975))
            ThreePointArc((-24.125002811, 1.975), (-20.79, 0.9525), (-17.454997189, 1.975))
        make_face()
    extrude(amount=-BOSS_EXTRUDE14_DEPTH)

    # Sketch29 → Boss-Extrude16 (add)
    with BuildSketch(Plane(origin=(0, 0, -35.745), x_dir=(-1, 0, 0), z_dir=(0, 0, -1)).offset(BOSS_EXTRUDE16_START)):
        with Locations((-20.79, 6.9025)):
            Circle(SKETCH29_R)
        with Locations(Location((-20.79, 6.9025, 0), (0, 0, 180))):
            Circle(SKETCH29_R_2, mode=Mode.SUBTRACT)
    extrude(amount=-BOSS_EXTRUDE16_DEPTH)

    # Boss-Extrude17: up to this face of the body (flat: up to its plane)
    boss_extrude17_end = Plane(part.part.faces().sort_by_distance((20.79, 8.452730204, -28.375))[0])
    # Sketch31 → Boss-Extrude17 (add, up to the picked face)
    with BuildSketch(Plane.XY.offset(-35.745), mode=Mode.PRIVATE) as boss_extrude17_sk1:
        with Locations((7.5875, 6.594522063)):
            Rectangle(SKETCH31_W, SKETCH31_H)
    boss_extrude17_tool1 = split(extrude(boss_extrude17_sk1.sketch, amount=BOSS_EXTRUDE17_REACH, mode=Mode.PRIVATE), bisect_by=boss_extrude17_end, keep=Keep.BOTH, mode=Mode.PRIVATE)
    # Sketch31 → Boss-Extrude17 (add, up to the picked face)
    with BuildSketch(Plane.XY.offset(-35.745), mode=Mode.PRIVATE) as boss_extrude17_sk2:
        with Locations((33.9925, 6.594522063)):
            Rectangle(SKETCH31_W, SKETCH31_H)
    boss_extrude17_tool2 = split(extrude(boss_extrude17_sk2.sketch, amount=BOSS_EXTRUDE17_REACH, mode=Mode.PRIVATE), bisect_by=boss_extrude17_end, keep=Keep.BOTH, mode=Mode.PRIVATE)
    add(boss_extrude17_tool1.solids().sort_by(Axis((7.5875, 6.594522, -35.745), (0, 0, 1)))[0])
    add(boss_extrude17_tool2.solids().sort_by(Axis((33.9925, 6.594522, -35.745), (0, 0, 1)))[0])

    # Sketch33 → Boss-Extrude18 (add)
    with BuildSketch(Plane.XZ):
        Polygon((3.175, -25.2), (3.175, -22.612118687), (0, -22.612118687), (0, -28.375), (6, -28.375), (9.175, -28.375), (32.405, -28.375), (35.58, -28.375), (41.58, -28.375), (41.58, -22.612118687), (38.405, -22.612118687), (38.405, -25.2), align=None)
    extrude(amount=BOSS_EXTRUDE18_DEPTH)

    # Sketch34 → Boss-Extrude19 (add)
    with BuildSketch(Plane.XY.offset(-30.745)):
        with Locations(Location((20.79, 6.9025, 0), (0, 0, 180))):
            Circle(SKETCH34_R)
    extrude(amount=BOSS_EXTRUDE19_DEPTH)

    # Chamfer7
    chamfer7_edges = [part.edges().sort_by_distance(p)[0] for p in [
        (20.79, -6.825, -35.745),
        (20.79, -6.825, -28.375),
    ]]
    chamfer(chamfer7_edges, length=CHAMFER7_SIZE - 0.0001)  # a hair under: the kernel refuses the full size

    # Chamfer8
    chamfer8_edges = [part.edges().sort_by_distance(p)[0] for p in [
        (39.9925, -6.825, -22.612118687),
        (1.5875, -6.825, -22.612118687),
    ]]
    chamfer(chamfer8_edges, length=CHAMFER8_SIZE)


with BuildPart() as body_2:
    # Mirror1: mirrored copy
    add(part.part.mirror(Plane(origin=(51.58, 0, 0), x_dir=(0, 0, 1), z_dir=(1, 0, 0))))


solid = body_2.part
